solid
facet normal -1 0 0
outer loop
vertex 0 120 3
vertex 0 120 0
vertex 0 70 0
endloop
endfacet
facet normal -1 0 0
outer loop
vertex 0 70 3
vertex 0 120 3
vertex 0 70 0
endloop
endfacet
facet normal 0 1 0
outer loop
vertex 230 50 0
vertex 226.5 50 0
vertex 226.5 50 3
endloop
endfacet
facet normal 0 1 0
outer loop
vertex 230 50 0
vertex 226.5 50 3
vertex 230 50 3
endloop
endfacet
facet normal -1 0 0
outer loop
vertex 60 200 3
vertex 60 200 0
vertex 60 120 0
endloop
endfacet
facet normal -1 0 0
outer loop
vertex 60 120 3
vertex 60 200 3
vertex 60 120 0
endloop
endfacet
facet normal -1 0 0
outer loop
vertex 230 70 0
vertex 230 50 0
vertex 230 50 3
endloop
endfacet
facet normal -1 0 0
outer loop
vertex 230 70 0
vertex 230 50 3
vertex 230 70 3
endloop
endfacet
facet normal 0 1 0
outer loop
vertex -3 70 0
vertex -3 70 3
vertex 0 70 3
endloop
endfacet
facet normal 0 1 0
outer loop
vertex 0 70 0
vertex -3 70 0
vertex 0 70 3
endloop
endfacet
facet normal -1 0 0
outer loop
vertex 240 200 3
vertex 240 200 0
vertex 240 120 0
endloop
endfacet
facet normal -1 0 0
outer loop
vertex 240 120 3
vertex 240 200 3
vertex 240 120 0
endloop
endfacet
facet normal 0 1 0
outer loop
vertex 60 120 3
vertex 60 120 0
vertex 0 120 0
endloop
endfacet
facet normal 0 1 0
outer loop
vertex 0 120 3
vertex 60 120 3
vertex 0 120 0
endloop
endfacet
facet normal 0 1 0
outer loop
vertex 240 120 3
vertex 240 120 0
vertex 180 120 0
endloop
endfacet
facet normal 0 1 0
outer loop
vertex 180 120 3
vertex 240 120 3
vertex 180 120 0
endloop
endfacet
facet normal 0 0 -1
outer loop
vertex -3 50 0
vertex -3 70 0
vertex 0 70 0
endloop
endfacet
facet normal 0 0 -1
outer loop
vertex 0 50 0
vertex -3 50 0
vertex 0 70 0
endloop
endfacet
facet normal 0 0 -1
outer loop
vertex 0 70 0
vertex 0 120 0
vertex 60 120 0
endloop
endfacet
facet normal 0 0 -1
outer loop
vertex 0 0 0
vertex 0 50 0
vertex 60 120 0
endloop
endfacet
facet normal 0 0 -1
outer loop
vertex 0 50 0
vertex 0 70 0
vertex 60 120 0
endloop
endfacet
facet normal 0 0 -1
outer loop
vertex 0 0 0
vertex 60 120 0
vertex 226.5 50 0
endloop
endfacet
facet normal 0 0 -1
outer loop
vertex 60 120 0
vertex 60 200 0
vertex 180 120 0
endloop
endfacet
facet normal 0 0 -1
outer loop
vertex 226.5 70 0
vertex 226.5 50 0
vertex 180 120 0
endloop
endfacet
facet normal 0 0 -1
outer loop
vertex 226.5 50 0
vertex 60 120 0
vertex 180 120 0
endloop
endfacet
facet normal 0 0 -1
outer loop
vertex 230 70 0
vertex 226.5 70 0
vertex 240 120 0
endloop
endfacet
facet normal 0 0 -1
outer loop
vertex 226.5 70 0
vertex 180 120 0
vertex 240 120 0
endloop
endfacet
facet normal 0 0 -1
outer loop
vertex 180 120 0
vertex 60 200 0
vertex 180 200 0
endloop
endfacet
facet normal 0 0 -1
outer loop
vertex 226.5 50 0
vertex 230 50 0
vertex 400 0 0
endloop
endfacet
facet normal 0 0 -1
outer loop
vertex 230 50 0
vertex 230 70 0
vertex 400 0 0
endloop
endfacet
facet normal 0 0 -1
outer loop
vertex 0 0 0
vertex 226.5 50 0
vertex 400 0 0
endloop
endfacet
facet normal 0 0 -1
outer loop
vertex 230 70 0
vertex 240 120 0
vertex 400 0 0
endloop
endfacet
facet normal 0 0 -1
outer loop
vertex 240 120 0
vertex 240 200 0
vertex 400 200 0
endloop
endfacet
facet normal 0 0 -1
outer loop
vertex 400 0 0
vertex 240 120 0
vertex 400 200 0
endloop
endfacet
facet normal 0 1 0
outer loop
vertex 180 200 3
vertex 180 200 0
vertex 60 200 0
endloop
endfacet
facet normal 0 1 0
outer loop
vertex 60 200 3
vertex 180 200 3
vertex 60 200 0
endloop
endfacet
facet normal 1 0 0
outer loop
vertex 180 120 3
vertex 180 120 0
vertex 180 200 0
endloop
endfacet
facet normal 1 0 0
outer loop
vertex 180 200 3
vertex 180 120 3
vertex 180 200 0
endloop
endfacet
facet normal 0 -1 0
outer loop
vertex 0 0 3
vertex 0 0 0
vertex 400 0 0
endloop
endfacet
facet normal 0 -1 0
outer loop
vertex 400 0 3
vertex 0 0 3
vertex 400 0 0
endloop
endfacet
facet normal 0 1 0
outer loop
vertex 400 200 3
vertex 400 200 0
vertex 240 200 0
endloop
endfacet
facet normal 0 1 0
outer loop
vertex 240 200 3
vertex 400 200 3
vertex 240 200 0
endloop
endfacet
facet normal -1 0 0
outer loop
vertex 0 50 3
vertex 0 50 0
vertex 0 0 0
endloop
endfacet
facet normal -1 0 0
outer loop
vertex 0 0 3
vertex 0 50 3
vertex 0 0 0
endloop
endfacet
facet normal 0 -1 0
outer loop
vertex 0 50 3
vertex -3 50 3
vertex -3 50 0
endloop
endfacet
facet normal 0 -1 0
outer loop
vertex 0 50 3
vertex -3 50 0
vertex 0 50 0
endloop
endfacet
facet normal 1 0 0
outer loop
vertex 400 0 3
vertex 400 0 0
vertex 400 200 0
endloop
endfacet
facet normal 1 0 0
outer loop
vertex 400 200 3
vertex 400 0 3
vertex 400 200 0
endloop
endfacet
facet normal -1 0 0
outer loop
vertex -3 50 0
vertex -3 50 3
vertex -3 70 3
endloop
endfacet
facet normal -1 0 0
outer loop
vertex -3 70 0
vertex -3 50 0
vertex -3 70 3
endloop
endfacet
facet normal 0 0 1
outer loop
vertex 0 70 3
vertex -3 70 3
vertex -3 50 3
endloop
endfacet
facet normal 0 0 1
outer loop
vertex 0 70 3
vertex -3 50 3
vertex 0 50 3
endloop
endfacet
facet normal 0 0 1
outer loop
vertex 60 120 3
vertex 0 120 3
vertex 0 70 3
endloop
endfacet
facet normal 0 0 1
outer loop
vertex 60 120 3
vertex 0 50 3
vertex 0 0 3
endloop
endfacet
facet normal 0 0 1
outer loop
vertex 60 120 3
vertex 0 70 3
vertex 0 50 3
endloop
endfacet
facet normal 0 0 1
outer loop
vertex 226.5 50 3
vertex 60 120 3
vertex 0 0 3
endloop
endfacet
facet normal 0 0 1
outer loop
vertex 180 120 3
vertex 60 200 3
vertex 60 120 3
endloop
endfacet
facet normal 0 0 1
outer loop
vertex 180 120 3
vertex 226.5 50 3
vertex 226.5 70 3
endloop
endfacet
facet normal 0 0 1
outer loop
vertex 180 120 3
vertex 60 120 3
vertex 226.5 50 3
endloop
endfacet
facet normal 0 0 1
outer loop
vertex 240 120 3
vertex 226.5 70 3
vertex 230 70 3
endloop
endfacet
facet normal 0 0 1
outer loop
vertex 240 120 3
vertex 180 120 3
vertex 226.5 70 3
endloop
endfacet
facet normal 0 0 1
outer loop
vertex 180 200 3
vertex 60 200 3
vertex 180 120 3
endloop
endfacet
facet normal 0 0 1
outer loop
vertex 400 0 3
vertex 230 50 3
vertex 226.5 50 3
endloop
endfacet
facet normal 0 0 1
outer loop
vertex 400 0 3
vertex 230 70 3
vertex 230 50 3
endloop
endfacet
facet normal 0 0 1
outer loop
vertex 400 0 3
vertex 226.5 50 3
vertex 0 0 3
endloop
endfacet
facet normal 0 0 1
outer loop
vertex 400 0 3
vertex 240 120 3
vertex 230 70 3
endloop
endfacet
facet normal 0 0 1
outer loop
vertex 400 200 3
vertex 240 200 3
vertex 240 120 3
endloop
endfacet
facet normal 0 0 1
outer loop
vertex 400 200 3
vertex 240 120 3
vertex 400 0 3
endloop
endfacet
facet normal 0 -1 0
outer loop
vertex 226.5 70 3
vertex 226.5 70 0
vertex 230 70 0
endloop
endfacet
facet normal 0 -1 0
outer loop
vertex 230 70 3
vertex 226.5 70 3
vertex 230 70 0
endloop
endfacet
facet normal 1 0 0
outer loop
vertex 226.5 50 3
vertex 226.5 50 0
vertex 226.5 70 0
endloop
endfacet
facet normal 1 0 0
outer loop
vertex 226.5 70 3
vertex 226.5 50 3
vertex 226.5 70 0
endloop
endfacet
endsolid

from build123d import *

# Parameters (mm, degrees)
F0_W     = 3.5
F0_H     = 20
F1_DEPTH = 3
F2_W     = 3
F2_H     = 20
F3_DEPTH = 3


with BuildPart() as f1:
    # F0 (on Top) → F1 (new body)
    with BuildSketch(Plane.XY):
        Polygon((60, 200), (60, 120), (0, 120), (0, 0), (400, 0), (400, 200), (240, 200), (240, 120), (180, 120), (180, 200), align=None)
        with Locations((228.25, 60)):
            Rectangle(F0_W, F0_H, mode=Mode.SUBTRACT)
    extrude(amount=F1_DEPTH)

    # F2 (on face) → F3 (join, through all)
    with BuildSketch(Plane.XY.offset(3)):
        with Locations((-1.5, 60)):
            Rectangle(F2_W, F2_H)
    extrude(amount=-F3_DEPTH)


solid = f1.part
